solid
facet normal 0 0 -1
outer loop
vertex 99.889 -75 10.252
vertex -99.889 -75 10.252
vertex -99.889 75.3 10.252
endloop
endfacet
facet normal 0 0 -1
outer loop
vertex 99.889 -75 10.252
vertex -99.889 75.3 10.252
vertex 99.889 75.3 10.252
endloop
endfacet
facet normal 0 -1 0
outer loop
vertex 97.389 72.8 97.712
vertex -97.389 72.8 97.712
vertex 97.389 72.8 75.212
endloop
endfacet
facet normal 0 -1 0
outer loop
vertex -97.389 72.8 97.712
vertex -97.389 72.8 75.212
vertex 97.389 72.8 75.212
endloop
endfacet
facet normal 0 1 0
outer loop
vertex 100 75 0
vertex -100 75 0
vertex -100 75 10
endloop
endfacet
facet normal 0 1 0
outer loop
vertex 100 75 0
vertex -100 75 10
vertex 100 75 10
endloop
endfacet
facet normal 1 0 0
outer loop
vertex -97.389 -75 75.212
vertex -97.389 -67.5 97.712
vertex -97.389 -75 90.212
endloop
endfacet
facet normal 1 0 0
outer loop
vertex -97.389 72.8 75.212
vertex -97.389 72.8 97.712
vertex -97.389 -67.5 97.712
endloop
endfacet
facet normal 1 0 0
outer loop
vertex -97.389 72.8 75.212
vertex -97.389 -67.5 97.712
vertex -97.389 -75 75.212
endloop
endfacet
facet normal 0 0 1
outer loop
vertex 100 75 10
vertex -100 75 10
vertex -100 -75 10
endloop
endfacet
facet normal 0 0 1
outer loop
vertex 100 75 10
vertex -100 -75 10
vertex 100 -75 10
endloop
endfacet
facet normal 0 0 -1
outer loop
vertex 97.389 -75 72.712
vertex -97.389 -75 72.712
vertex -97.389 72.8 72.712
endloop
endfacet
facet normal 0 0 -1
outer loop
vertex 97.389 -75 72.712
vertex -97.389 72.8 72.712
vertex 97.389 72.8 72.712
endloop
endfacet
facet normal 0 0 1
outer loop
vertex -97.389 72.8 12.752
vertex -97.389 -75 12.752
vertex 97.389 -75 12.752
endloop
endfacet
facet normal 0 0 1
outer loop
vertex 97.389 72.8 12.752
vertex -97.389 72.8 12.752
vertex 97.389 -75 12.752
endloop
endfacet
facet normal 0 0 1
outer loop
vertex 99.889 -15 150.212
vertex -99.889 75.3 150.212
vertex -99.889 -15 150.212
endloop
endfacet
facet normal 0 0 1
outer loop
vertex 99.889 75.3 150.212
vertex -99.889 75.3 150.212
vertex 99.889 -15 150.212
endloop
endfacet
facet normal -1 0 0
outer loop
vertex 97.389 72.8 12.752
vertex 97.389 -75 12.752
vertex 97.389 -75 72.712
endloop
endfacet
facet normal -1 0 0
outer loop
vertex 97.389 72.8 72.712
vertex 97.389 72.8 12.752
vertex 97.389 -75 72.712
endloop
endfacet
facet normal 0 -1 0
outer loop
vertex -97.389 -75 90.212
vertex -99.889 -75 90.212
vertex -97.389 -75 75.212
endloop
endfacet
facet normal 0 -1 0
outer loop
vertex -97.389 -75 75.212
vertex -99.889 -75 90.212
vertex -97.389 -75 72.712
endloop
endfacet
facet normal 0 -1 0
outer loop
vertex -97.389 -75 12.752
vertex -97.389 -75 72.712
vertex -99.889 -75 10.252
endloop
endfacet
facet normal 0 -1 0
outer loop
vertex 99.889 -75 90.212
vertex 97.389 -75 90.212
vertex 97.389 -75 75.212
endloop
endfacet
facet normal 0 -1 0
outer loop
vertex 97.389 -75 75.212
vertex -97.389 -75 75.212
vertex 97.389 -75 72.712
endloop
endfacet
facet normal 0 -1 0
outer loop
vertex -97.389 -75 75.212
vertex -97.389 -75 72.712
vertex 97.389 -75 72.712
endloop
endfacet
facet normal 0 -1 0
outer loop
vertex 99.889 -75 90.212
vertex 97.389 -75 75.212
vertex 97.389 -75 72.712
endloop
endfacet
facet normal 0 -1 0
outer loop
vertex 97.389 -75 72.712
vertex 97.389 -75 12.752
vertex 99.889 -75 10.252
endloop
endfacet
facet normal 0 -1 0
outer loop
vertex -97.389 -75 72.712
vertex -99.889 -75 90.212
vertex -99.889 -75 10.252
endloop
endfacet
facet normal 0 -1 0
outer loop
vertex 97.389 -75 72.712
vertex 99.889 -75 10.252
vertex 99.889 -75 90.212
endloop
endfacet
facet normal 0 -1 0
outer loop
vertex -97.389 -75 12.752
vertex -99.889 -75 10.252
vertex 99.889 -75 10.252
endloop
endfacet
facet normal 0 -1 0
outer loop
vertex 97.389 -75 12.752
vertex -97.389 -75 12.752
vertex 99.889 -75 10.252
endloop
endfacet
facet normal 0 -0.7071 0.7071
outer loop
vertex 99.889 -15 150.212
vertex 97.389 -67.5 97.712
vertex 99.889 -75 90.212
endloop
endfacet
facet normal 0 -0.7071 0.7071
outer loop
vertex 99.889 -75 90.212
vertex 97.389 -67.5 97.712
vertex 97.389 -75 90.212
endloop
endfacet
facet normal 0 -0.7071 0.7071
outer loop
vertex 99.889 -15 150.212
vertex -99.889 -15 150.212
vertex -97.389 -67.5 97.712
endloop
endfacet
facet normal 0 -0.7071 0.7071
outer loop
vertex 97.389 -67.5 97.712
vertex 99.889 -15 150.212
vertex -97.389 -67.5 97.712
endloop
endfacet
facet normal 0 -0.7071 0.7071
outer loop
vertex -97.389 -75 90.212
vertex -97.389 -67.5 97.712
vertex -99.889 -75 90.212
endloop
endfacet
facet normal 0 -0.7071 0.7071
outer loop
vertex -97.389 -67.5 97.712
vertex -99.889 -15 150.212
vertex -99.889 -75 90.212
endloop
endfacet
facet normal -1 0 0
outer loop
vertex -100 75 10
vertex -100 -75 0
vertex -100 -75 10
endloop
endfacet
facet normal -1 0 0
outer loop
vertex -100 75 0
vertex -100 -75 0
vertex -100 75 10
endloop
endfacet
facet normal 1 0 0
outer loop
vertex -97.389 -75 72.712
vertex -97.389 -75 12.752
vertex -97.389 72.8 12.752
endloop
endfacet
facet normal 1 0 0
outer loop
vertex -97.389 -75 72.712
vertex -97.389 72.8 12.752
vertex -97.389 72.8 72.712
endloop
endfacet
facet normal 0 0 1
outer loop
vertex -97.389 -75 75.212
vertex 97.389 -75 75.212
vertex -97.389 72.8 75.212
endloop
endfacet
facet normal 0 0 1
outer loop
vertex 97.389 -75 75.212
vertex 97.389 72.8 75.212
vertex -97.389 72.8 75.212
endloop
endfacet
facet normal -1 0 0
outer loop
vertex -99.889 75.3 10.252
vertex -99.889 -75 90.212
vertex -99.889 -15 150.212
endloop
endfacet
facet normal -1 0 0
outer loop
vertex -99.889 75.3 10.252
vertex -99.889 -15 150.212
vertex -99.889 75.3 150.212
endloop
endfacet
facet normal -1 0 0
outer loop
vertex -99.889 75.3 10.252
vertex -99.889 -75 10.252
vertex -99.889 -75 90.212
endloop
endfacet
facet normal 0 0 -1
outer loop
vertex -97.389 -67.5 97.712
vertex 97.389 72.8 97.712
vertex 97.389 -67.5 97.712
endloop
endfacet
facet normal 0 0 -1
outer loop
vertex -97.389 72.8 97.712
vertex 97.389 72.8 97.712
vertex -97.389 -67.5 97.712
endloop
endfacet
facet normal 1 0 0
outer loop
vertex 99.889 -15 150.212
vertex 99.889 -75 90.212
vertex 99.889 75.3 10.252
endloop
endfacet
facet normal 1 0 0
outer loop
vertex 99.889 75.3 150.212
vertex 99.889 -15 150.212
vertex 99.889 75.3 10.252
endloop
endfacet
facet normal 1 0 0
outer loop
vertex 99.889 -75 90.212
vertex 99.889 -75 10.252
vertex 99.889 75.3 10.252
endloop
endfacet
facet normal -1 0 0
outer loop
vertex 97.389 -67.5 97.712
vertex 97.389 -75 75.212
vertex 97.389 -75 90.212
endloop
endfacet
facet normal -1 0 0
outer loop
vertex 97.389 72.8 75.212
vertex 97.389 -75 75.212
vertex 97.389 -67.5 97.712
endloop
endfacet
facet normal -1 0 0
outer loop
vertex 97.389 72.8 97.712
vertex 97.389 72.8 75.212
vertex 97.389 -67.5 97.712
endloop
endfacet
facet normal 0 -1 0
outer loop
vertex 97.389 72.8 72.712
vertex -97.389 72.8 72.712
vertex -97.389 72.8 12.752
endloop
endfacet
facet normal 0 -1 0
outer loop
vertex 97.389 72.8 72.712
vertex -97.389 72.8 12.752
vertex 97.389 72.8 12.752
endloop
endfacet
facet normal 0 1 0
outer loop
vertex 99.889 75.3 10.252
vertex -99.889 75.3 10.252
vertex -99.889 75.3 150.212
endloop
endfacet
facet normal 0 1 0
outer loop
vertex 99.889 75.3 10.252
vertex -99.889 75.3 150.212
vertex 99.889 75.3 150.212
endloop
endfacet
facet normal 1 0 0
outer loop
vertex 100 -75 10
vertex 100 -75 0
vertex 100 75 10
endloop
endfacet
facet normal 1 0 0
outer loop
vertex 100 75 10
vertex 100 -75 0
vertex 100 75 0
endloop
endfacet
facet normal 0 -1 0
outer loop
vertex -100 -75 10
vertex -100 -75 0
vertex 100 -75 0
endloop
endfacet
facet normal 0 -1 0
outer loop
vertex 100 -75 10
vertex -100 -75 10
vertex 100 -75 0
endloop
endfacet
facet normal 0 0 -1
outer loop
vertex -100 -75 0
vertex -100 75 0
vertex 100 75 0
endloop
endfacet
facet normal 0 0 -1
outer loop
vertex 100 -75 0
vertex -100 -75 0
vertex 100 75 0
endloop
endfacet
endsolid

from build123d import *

# Parameters (mm, degrees)
F0_W         = 200
F0_H         = 150
F1_DEPTH     = 10
F2_W         = 199.7782438993
F2_H         = 64.9596797302
F3_DEPTH     = 75
F4_DEPTH     = 75.3
F5_T         = -2.5
F6_DEPTH     = 25
F7_T         = -2.5
F8_W         = 199.7782438993
F8_H         = 150.3
F9_DEPTH     = 50
F10_T1_DEPTH = 508.3802024553
F12_DEPTH    = 9.4


# Not quite as in the source:
# - a fillet or chamfer that OpenCascade refuses, or shapes differently, is made with other operations: its cross-section is extruded or revolved along the edge and cut away or added
# - a shell that OpenCascade refuses in one call is made with other operations: the cavity is built on its own and cut out
# - the program builds the solid bodies; features that only make, move or delete a surface that nothing else refers to are left out


with BuildPart() as f1:
    # F0 (on Top) → F1 (new body)
    with BuildSketch(Plane.XY):
        Rectangle(F0_W, F0_H)
    extrude(amount=F1_DEPTH)


with BuildPart() as f3:
    # F2 (on Front) → F3 (new body)
    with BuildSketch(Plane.XZ):
        with Locations((0, 42.7318564616)):
            Rectangle(F2_W, F2_H)
    extrude(amount=F3_DEPTH)

    # F4 (add): a face of the model
    f4_faces = [f3.faces().sort_by_distance(p)[0] for p in [
        (0, 0, 42.7318564616),
    ]]
    extrude(f4_faces, amount=F4_DEPTH)

    # F5
    f5_openings = [f3.faces().sort_by_distance(p)[0] for p in [
        (0, -75, 42.731856),
    ]]
    offset(amount=F5_T, openings=f5_openings)

    # F6 (add): a face of the model
    f6_faces = [f3.faces().sort_by_distance(p)[0] for p in [
        (0, 0.15, 75.2116963267),
    ]]
    extrude(f6_faces, amount=F6_DEPTH)

    # F7: a shell. OpenCascade refuses it in one call, so the cavity is built on its own and cut out:
    # the body offset inwards by the wall thickness, plus a prism from it out through each open face.
    f7_core = offset(f3.part, amount=F7_T, kind=Kind.INTERSECTION, mode=Mode.PRIVATE)
    f7_exits = [f7_core.faces().sort_by_distance(p)[0] for p in [
        (0, -72.5, 86.461696),
    ]]
    add(f7_core, mode=Mode.SUBTRACT)
    extrude(f7_exits, amount=-F7_T, mode=Mode.SUBTRACT)

    # F8 (on face) → F9 (join)
    with BuildSketch(Plane.XY.offset(100.2116963267)):
        with Locations((0, 0.15)):
            Rectangle(F8_W, F8_H)
    extrude(amount=F9_DEPTH)

    # F10: chamfer of 60 on 1 edges, made by hand

    # F10_s2 → F10_t1 (cut)
    with BuildSketch(Plane.YZ.offset(-254.1901012276)):
        Polygon((-15, 150.2116963267), (-75, 90.2116963267), (-75, 150.2116963267), align=None)
    extrude(amount=F10_T1_DEPTH, mode=Mode.SUBTRACT)

    # F11 (on face) → F12 (join)
    with BuildSketch(Plane(origin=(0, -82.6058481634, 82.6058481634), x_dir=(1, 0, 0), z_dir=(0, -0.7071067812, 0.7071067812))):
        Polygon((76.5384733677, 70.738479495), (-67.3584118485, 70.738479495), (76.5384733677, 43.4501171112), align=None)
    extrude(amount=-F12_DEPTH)


solid = Compound([f1.part, f3.part])
